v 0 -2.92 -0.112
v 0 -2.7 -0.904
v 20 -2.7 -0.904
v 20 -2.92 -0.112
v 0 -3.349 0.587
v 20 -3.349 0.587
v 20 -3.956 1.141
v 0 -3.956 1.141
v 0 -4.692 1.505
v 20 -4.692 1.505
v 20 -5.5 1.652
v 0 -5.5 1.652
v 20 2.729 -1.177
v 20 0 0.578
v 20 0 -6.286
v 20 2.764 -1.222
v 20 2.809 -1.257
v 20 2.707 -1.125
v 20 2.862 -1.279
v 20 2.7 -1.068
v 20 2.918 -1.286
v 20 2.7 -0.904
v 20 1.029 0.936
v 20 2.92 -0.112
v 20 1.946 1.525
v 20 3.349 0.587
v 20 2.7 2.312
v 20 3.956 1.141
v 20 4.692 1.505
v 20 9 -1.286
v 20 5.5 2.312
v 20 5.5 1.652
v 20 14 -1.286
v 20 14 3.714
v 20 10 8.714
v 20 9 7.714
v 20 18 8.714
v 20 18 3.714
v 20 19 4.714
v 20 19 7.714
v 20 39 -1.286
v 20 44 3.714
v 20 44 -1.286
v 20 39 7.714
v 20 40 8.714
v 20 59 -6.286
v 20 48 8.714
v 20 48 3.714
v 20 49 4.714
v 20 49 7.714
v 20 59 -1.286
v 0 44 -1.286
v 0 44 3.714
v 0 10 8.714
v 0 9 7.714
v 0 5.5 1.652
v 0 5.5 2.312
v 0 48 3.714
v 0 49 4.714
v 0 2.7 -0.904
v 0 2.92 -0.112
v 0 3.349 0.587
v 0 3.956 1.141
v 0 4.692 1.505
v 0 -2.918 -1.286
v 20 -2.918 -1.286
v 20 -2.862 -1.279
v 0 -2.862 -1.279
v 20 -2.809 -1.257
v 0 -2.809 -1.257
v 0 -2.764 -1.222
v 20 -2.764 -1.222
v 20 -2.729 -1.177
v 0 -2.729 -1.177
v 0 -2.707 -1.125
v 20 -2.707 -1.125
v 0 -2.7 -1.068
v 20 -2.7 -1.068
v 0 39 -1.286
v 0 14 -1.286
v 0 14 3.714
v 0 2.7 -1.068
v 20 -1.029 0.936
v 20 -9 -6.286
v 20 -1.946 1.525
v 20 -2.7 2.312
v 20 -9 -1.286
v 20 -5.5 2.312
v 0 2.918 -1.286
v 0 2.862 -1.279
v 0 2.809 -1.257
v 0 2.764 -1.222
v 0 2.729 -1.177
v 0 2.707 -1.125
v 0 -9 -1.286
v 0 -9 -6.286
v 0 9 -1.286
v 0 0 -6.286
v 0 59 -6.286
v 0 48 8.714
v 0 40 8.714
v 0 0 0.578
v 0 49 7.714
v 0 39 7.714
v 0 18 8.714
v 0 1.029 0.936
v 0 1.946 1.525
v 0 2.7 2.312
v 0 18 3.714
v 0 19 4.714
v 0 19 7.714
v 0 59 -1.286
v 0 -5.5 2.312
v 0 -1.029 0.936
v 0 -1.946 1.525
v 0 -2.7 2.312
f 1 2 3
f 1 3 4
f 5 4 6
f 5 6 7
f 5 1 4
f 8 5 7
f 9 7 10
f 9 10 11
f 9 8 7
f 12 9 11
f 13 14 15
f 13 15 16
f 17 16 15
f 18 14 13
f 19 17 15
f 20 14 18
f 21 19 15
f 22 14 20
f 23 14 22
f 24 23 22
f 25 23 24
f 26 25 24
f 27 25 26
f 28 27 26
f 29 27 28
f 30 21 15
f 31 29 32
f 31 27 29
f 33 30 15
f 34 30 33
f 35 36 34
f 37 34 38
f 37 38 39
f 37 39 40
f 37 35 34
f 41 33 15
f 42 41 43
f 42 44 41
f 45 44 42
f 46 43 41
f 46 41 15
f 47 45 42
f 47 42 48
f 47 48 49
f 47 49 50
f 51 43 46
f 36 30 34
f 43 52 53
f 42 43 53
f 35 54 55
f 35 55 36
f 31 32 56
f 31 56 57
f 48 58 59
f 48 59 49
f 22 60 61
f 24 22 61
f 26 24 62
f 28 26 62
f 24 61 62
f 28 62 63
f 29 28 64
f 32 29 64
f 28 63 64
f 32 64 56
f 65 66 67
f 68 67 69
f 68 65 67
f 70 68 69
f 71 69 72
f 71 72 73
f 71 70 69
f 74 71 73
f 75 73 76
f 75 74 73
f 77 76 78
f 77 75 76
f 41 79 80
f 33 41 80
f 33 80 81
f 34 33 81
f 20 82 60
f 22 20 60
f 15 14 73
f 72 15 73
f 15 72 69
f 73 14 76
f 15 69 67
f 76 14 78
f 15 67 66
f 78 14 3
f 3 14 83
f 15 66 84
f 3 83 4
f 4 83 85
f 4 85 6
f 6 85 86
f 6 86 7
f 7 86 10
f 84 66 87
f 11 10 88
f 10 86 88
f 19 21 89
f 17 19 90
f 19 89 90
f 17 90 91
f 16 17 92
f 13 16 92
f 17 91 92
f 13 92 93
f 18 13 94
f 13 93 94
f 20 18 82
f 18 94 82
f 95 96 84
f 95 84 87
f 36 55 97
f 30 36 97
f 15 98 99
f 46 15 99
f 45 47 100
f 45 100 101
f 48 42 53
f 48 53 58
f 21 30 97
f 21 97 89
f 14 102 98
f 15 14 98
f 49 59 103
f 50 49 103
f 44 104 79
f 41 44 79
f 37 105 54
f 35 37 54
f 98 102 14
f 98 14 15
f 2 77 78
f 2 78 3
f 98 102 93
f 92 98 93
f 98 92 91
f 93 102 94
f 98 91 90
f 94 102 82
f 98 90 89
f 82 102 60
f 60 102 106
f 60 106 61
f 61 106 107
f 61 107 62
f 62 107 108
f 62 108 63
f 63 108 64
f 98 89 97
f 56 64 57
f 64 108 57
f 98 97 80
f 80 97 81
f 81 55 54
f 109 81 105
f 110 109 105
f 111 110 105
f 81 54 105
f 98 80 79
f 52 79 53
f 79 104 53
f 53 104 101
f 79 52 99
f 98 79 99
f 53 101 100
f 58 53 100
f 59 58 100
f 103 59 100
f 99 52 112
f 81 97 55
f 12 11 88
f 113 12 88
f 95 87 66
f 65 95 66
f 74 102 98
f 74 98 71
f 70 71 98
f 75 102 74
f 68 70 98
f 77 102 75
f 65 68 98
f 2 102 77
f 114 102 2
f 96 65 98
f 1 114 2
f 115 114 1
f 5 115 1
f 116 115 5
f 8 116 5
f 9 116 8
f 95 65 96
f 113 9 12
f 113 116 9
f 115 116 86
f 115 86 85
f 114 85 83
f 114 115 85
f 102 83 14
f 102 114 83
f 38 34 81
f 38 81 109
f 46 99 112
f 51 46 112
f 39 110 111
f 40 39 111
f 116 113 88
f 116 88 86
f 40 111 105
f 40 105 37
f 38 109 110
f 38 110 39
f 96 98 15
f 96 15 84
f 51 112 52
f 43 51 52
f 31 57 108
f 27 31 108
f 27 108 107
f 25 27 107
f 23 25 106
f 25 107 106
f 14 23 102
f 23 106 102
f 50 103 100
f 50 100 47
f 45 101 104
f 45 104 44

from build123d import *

# Parameters (mm, degrees)
F1_DEPTH = 20
F3_DEPTH = 20
F4_SIZE  = 1


# Not quite as in the source:
# - a pattern or mirror of a feature is missing from the dataset's text; its kind, count and spacing are read off the source's solid


with BuildPart() as f1:
    # F0 (on Right) → F1 (new body)
    with BuildSketch(Plane.YZ):
        with BuildLine():
            Line((5.5, 2.3115177173), (2.7, 2.3115177173))
            ThreePointArc((2.7, 2.3115177173), (1.5050999961, 1.2033549585), (0, 0.5784671916))
            Line((0, 0.5784671916), (0, -6.2862326842))
            Line((0, -6.2862326842), (9, -6.2862326842))
            Line((9, -6.2862326842), (9, -1.2862326842))
            Line((9, -1.2862326842), (2.9180552616, -1.2862326842))
            ThreePointArc((2.9180552616, -1.2862326842), (2.7638669074, -1.2223657768), (2.7, -1.0681774227))
            Line((2.7, -1.0681774227), (2.7, -0.9035626068))
            ThreePointArc((2.7, -0.9035626068), (3.6332473174, 0.8854712641), (5.5, 1.6515177173))
            Line((5.5, 1.6515177173), (5.5, 2.3115177173))
        make_face()
    extrude(amount=F1_DEPTH)


with BuildPart() as f1_copies_1:
    # F1_copies: instance of F1
    add(f1.part.mirror(Plane(origin=(0, 0, 0), x_dir=(0, 0, -1), z_dir=(0, -1, 0))))


with BuildPart() as f1_1:
    add(f1.part)

    # F2 (on Right) → F3 (join)
    with BuildSketch(Plane.YZ):
        Polygon((9, 8.7137673158), (9, -6.2862326842), (59, -6.2862326842), (59, -1.2862326842), (44, -1.2862326842), (44, 3.7137673158), (49, 3.7137673158), (49, 8.7137673158), (39, 8.7137673158), (39, -1.2862326842), (14, -1.2862326842), (14, 3.7137673158), (19, 3.7137673158), (19, 8.7137673158), align=None)
    extrude(amount=F3_DEPTH)

    # F4
    f4_edges = [f1_1.edges().sort_by_distance(p)[0] for p in [
        (10, 19, 3.713767),
        (10, 19, 8.713767),
        (10, 49, 8.713767),
        (10, 49, 3.713767),
        (10, 39, 8.713767),
        (10, 9, 8.713767),
    ]]
    chamfer(f4_edges, length=F4_SIZE)


solid = Compound([f1_copies_1.part, f1_1.part])
